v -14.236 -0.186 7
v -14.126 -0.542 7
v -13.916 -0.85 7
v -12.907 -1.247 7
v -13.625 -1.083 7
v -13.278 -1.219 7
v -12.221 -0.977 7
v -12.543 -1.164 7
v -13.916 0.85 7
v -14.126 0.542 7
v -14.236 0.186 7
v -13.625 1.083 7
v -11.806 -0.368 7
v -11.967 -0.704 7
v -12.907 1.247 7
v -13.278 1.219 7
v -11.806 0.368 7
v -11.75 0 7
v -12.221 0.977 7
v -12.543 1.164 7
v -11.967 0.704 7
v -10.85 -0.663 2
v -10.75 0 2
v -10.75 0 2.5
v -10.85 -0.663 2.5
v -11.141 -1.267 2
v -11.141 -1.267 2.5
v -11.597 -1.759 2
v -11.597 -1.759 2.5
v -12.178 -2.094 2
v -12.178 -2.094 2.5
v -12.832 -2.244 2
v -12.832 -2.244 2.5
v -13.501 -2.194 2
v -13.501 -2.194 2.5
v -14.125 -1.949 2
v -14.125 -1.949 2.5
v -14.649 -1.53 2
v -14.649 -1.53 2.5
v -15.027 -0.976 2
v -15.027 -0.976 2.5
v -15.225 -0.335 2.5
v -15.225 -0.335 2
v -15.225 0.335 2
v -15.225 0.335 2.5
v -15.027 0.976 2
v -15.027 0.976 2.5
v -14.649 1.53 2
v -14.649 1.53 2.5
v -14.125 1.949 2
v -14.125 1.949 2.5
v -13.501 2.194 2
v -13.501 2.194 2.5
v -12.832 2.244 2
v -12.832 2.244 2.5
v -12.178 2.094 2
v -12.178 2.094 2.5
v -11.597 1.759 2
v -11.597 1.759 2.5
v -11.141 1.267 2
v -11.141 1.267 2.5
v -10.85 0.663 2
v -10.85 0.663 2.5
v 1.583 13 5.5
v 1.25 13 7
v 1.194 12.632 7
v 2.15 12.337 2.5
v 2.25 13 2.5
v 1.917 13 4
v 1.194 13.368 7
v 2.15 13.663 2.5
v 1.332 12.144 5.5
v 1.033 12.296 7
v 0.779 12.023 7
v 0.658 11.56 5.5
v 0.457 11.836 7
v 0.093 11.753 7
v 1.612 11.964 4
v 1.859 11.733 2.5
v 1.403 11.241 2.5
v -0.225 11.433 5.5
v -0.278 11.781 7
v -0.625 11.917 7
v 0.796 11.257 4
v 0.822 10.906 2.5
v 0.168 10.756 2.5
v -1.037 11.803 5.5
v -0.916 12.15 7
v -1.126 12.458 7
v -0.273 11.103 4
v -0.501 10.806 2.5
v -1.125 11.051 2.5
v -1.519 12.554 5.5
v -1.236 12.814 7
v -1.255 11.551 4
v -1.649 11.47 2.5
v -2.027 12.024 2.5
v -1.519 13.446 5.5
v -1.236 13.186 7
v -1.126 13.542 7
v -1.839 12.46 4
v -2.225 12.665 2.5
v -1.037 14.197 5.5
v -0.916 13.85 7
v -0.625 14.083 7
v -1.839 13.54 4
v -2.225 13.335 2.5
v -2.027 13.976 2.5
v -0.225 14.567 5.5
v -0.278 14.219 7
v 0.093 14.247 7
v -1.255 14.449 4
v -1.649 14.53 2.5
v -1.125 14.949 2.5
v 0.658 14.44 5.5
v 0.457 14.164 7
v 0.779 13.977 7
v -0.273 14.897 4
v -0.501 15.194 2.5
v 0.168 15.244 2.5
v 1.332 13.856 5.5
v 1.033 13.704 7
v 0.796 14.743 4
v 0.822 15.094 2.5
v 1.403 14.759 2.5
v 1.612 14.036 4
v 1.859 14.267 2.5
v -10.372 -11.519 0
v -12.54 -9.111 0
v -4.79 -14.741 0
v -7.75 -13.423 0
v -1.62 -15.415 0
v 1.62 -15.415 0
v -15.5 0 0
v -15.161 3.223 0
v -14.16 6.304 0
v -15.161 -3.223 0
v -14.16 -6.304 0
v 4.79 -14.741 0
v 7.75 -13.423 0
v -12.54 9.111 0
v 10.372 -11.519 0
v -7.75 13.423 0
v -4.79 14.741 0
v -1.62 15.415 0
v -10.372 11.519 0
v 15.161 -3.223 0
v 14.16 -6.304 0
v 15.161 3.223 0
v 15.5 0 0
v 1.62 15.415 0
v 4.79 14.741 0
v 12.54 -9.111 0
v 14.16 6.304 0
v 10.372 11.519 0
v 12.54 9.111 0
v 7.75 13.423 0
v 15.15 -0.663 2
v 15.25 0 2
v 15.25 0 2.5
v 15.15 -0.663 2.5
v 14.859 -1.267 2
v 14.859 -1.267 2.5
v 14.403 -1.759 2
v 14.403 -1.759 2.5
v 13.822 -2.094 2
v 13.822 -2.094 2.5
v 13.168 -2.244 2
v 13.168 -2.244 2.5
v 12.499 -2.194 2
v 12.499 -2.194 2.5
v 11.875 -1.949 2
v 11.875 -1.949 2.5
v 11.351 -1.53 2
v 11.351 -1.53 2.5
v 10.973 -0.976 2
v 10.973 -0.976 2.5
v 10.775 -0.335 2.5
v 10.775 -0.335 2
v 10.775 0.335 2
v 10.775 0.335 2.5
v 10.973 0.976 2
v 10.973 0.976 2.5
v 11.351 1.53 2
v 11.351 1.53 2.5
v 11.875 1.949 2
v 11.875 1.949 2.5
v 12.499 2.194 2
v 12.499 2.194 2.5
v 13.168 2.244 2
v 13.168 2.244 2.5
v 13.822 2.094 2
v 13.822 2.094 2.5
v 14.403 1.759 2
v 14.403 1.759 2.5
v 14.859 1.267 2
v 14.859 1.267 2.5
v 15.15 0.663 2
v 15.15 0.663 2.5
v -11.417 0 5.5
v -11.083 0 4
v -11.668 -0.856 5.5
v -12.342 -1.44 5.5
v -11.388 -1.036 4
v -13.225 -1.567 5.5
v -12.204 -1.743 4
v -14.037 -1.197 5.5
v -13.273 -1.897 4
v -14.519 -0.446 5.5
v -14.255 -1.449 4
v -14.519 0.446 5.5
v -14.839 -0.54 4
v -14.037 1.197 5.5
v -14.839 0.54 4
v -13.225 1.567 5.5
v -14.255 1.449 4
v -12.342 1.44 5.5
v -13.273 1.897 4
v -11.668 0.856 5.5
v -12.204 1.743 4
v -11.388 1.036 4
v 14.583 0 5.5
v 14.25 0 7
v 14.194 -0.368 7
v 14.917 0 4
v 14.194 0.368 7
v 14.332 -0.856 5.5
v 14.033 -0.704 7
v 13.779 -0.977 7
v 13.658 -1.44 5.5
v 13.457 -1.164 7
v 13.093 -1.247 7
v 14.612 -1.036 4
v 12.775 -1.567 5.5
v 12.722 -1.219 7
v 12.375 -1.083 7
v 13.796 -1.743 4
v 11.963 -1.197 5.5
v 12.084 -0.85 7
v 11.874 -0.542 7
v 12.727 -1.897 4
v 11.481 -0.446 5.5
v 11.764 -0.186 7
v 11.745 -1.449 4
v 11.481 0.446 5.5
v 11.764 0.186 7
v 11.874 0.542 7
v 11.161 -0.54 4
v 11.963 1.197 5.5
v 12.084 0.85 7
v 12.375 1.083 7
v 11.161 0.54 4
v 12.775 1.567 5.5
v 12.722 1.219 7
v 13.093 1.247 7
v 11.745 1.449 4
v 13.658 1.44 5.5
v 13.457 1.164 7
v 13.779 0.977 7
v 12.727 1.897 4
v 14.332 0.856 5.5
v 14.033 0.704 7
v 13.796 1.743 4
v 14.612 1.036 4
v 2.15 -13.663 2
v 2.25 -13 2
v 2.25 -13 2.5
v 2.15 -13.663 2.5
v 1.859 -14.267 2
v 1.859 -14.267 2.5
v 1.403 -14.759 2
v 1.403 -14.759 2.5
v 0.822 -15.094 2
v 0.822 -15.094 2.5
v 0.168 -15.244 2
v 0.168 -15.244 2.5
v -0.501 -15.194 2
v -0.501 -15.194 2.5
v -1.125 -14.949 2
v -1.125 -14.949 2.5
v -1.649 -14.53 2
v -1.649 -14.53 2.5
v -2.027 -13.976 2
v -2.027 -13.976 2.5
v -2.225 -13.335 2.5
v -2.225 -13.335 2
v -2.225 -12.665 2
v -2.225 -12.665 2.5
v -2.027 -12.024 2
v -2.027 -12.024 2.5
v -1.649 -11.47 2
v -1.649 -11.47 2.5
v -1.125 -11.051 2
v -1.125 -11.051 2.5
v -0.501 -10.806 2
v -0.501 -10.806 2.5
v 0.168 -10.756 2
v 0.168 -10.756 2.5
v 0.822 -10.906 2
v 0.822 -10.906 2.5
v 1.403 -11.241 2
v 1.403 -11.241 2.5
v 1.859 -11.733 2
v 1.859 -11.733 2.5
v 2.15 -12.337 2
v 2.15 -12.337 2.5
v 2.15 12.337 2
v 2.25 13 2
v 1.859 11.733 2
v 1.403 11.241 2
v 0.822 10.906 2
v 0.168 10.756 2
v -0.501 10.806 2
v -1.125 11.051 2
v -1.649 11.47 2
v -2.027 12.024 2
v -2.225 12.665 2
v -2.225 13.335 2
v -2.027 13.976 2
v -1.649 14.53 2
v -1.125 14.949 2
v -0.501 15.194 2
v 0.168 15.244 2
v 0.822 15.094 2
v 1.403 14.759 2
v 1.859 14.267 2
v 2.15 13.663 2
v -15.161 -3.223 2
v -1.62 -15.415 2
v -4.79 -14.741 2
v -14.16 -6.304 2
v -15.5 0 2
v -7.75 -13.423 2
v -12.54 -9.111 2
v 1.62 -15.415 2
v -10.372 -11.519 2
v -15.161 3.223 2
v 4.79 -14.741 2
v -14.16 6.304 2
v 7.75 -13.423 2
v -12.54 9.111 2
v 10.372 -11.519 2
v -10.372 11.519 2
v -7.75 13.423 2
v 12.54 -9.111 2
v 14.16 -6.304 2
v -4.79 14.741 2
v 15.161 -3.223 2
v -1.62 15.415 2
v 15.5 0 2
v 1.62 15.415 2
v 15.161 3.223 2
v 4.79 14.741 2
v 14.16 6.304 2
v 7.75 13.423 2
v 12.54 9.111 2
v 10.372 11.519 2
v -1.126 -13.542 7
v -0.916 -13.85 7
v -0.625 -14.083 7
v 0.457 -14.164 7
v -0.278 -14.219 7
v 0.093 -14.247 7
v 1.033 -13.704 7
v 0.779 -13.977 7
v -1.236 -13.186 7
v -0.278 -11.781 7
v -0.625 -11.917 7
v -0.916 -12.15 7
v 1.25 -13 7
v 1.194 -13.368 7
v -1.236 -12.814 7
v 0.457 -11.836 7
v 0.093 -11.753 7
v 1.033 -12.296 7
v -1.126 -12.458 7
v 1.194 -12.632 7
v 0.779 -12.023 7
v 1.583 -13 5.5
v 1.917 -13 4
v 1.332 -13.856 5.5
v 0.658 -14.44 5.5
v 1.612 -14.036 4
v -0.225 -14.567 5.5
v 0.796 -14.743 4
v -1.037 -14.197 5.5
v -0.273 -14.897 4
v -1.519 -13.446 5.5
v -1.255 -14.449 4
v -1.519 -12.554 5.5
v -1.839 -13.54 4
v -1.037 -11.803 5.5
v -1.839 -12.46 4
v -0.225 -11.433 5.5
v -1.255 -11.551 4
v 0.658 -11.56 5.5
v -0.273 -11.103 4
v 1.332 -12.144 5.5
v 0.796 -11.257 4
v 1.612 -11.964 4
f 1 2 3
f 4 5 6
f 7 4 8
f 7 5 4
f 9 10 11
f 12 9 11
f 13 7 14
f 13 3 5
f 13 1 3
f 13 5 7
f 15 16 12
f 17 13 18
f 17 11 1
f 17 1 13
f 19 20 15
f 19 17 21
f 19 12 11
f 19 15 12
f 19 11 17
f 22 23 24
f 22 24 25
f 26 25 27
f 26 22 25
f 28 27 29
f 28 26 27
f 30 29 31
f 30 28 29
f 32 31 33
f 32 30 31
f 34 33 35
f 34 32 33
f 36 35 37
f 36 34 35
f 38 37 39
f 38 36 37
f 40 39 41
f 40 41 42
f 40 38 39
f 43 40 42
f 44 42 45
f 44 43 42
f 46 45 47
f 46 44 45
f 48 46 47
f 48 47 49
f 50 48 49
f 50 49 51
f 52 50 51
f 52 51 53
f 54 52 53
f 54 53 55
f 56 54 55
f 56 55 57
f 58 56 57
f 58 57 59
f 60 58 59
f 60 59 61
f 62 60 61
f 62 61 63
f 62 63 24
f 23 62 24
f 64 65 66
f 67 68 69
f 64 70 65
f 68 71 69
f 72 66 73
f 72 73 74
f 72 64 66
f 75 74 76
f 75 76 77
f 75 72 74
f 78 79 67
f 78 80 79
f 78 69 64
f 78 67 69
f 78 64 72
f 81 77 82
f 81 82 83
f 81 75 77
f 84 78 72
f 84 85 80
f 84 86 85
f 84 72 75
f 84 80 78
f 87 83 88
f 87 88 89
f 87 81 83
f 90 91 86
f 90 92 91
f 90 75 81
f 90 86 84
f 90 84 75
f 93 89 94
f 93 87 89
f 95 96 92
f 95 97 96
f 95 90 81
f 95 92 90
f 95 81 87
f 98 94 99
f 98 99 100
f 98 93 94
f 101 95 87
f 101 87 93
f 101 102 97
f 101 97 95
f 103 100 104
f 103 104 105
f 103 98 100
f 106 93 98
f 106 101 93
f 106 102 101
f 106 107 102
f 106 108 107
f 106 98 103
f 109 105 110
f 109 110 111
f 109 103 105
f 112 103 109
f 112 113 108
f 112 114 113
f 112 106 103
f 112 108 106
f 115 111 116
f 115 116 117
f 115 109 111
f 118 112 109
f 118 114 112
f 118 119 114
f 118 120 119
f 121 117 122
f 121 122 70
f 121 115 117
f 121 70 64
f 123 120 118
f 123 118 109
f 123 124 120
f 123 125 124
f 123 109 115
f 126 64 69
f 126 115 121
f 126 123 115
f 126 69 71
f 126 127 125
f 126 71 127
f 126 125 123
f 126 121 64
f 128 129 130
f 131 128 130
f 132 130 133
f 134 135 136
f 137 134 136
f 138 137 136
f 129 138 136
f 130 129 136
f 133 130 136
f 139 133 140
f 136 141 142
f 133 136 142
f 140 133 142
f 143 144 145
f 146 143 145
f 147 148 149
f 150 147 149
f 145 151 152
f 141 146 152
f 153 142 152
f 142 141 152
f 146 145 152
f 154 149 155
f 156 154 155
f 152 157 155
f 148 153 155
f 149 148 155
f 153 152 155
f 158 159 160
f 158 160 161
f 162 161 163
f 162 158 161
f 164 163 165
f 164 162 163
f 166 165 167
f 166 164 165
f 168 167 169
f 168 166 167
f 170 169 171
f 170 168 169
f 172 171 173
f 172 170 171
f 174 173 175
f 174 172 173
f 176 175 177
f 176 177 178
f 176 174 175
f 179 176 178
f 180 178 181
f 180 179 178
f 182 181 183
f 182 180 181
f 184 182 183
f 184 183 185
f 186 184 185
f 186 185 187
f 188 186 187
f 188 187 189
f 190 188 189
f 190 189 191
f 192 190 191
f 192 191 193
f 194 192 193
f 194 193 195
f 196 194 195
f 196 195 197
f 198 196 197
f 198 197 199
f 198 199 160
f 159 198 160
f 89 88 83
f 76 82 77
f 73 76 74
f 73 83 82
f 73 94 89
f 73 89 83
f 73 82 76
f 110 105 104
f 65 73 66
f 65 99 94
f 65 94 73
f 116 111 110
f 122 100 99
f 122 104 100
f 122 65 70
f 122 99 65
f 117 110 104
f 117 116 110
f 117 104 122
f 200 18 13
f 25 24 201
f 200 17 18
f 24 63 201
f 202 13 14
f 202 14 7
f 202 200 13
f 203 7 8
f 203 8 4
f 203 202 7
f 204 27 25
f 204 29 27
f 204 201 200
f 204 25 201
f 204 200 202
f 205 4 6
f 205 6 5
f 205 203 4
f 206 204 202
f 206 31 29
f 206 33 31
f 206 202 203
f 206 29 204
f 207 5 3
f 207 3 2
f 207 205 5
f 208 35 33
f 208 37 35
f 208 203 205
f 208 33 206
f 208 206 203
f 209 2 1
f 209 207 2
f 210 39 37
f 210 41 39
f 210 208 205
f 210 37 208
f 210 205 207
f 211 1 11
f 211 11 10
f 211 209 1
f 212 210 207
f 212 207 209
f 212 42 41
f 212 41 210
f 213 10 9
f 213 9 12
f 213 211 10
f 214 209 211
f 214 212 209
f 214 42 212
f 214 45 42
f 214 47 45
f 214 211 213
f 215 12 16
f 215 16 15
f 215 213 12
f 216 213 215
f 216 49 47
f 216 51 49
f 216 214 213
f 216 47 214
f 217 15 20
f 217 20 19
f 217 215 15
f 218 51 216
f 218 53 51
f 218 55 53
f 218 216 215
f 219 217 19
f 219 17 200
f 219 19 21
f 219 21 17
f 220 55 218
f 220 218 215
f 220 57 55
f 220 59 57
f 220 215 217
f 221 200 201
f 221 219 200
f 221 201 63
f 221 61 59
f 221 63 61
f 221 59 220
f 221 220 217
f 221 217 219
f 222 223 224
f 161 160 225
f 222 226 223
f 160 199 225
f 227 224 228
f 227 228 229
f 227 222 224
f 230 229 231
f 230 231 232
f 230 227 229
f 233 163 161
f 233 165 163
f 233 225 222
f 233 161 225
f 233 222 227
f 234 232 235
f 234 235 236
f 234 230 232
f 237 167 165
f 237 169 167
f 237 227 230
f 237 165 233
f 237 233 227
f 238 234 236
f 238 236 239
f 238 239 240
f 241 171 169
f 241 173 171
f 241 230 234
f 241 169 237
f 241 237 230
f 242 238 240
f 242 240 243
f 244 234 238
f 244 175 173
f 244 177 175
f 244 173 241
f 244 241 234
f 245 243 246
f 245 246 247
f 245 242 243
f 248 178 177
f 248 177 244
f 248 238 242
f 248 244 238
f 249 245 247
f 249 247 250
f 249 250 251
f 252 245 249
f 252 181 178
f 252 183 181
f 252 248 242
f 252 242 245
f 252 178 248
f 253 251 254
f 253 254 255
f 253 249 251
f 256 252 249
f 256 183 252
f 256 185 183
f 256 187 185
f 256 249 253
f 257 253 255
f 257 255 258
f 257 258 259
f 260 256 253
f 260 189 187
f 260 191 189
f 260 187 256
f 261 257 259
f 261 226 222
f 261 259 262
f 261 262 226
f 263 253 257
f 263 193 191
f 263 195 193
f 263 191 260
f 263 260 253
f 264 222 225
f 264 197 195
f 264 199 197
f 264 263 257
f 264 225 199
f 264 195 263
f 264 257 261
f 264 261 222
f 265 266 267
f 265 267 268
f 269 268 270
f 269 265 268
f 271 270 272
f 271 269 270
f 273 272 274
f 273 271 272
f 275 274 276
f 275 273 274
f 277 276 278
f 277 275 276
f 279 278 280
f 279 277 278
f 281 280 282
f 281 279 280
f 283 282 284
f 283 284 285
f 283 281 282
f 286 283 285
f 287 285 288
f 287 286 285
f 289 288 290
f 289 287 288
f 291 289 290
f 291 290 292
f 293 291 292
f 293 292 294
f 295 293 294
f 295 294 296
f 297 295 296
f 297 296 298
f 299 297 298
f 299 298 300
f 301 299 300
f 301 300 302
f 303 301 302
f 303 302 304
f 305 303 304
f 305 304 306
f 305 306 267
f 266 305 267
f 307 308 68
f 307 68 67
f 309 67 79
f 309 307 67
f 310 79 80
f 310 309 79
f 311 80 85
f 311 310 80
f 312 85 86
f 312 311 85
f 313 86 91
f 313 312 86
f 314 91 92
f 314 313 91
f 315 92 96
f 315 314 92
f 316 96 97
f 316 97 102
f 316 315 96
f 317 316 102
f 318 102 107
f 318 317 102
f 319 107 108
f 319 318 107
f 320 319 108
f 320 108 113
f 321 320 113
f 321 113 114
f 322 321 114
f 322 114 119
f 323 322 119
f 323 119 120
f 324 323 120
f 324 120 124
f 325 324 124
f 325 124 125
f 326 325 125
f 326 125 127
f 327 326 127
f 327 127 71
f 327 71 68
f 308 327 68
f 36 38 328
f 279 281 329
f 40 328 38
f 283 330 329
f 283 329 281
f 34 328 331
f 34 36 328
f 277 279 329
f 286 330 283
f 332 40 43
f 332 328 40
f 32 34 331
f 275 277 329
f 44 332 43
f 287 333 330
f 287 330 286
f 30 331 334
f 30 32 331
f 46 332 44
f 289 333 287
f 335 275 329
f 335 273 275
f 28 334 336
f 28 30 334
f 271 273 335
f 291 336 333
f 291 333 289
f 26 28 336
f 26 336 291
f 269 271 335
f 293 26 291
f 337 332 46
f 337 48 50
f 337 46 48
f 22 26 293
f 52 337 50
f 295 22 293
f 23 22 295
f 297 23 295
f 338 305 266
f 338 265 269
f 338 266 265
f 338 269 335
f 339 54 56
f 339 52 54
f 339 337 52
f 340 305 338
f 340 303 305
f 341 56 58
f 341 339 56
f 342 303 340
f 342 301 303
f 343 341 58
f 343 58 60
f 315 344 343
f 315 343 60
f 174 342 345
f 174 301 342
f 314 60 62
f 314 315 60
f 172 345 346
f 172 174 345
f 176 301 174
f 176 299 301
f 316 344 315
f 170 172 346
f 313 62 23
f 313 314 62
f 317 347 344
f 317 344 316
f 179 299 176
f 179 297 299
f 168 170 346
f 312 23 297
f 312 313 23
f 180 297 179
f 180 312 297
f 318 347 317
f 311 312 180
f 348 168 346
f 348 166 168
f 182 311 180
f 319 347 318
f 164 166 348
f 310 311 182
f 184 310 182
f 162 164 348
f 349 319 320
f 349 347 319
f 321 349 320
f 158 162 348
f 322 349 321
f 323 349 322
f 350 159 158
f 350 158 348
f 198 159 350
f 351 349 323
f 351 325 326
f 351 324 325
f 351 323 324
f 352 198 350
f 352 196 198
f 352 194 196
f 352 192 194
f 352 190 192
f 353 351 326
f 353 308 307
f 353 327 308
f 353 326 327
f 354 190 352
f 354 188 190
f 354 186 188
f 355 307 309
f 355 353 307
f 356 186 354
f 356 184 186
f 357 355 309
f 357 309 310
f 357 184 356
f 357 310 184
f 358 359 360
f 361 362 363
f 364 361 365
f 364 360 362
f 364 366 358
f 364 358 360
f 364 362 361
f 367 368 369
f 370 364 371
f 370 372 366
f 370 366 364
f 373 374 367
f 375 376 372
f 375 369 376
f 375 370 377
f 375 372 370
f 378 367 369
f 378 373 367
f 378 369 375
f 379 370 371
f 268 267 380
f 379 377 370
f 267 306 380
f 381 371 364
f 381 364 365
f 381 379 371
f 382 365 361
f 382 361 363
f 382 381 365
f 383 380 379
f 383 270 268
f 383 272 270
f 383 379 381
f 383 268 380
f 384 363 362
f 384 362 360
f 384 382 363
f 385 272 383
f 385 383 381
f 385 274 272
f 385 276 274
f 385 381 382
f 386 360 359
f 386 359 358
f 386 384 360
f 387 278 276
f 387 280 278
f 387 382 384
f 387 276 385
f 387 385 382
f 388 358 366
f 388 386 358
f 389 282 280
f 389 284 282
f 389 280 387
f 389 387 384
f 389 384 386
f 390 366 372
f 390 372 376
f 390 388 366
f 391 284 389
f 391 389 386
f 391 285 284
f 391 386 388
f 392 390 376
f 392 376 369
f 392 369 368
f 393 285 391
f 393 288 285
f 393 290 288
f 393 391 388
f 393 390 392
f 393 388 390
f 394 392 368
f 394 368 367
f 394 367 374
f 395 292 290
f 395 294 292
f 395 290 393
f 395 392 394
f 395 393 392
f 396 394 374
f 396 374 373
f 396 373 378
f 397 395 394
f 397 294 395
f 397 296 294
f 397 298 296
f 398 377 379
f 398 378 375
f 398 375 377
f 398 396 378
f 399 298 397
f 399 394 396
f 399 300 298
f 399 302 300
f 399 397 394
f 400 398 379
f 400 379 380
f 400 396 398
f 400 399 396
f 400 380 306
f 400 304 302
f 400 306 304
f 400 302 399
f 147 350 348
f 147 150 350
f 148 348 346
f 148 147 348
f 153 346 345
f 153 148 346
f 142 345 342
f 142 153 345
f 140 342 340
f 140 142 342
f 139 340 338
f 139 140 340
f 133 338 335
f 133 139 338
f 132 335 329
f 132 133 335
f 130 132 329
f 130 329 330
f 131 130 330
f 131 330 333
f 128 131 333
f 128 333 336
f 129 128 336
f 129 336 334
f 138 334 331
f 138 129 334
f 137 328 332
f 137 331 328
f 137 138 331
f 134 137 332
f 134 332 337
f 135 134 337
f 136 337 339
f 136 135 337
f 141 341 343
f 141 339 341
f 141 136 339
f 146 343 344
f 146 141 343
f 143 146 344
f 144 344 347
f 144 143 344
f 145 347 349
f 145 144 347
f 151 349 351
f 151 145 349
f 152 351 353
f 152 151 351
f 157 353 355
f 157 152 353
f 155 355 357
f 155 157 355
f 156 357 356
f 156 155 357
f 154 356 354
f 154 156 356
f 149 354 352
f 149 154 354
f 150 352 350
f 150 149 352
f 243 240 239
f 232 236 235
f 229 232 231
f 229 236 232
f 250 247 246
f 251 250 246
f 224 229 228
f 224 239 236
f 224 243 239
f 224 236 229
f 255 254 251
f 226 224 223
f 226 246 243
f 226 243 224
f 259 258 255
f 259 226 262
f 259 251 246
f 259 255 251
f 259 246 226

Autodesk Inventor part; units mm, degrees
sketch "Sketch1" plane through (0, 0, 0) normal (0, 0, 1) x (1, 0, 0)
  line L0 (0, 2.5316) -> (0, -2.5316) construction
  line L1 (-5.1172, 0) -> (5.1172, 0) construction
  circle A0 centre (0, 0) radius 15.5
  dimension "d0" = 31
extrude "Extrusion1" add sketch "Sketch1" along normal blind 2
sketch "Sketch2" plane through (0, 0, 2) normal (0, 0, 1) x (1, 0, 0)
  circle A0 centre (0, 0) radius 13
  line L0 (0, 0) -> (0, 13)
  line L1 (0, 0) -> (13, 0)
  line L2 (0, 0) -> (0, -13)
  line L3 (0, 0) -> (-13, 0)
  circle A1 centre (-13, 0) radius 2.25
  circle A2 centre (0, 13) radius 2.25
  circle A3 centre (13, 0) radius 2.25
  circle A4 centre (0, -13) radius 2.25
  dimension "d3" = 26
  dimension "d4" = 4.5
  dimension "d5" = 4.5
  dimension "d6" = 4.5
  dimension "d7" = 4.5
extrude "Extrusion2" add sketch "Sketch2" along normal blind 5 contours L1 A3 A0 | A0 A3 | A0 A3 L1 | A2 L0 A0 | A0 A2 | A4 A0 | A0 L2 A4 | L0 A2 A0 | A0 A4 L2 | A1 A0 L3 | L3 A0 A1 | A0 A1
chamfer "Chamfer1" distance 1 distance2 4.5 1 edges at (-15.25, 0, 7) measured on face at (-13.6641, 0.3485, 7)
chamfer "Chamfer2" distance 1 distance2 4.5 1 edges at (-2.25, -13, 7) measured on face at (-0.0904, -12.342, 7)
chamfer "Chamfer3" distance 1 distance2 4.5 1 edges at (10.75, 0, 7) measured on face at (12.3359, 0.3485, 7)
chamfer "Chamfer4" distance 1 distance2 4.5 1 edges at (-2.25, 13, 7) measured on face at (-0.0904, 13.658, 7)
properties part number "Kogel houder2" material "S235"
